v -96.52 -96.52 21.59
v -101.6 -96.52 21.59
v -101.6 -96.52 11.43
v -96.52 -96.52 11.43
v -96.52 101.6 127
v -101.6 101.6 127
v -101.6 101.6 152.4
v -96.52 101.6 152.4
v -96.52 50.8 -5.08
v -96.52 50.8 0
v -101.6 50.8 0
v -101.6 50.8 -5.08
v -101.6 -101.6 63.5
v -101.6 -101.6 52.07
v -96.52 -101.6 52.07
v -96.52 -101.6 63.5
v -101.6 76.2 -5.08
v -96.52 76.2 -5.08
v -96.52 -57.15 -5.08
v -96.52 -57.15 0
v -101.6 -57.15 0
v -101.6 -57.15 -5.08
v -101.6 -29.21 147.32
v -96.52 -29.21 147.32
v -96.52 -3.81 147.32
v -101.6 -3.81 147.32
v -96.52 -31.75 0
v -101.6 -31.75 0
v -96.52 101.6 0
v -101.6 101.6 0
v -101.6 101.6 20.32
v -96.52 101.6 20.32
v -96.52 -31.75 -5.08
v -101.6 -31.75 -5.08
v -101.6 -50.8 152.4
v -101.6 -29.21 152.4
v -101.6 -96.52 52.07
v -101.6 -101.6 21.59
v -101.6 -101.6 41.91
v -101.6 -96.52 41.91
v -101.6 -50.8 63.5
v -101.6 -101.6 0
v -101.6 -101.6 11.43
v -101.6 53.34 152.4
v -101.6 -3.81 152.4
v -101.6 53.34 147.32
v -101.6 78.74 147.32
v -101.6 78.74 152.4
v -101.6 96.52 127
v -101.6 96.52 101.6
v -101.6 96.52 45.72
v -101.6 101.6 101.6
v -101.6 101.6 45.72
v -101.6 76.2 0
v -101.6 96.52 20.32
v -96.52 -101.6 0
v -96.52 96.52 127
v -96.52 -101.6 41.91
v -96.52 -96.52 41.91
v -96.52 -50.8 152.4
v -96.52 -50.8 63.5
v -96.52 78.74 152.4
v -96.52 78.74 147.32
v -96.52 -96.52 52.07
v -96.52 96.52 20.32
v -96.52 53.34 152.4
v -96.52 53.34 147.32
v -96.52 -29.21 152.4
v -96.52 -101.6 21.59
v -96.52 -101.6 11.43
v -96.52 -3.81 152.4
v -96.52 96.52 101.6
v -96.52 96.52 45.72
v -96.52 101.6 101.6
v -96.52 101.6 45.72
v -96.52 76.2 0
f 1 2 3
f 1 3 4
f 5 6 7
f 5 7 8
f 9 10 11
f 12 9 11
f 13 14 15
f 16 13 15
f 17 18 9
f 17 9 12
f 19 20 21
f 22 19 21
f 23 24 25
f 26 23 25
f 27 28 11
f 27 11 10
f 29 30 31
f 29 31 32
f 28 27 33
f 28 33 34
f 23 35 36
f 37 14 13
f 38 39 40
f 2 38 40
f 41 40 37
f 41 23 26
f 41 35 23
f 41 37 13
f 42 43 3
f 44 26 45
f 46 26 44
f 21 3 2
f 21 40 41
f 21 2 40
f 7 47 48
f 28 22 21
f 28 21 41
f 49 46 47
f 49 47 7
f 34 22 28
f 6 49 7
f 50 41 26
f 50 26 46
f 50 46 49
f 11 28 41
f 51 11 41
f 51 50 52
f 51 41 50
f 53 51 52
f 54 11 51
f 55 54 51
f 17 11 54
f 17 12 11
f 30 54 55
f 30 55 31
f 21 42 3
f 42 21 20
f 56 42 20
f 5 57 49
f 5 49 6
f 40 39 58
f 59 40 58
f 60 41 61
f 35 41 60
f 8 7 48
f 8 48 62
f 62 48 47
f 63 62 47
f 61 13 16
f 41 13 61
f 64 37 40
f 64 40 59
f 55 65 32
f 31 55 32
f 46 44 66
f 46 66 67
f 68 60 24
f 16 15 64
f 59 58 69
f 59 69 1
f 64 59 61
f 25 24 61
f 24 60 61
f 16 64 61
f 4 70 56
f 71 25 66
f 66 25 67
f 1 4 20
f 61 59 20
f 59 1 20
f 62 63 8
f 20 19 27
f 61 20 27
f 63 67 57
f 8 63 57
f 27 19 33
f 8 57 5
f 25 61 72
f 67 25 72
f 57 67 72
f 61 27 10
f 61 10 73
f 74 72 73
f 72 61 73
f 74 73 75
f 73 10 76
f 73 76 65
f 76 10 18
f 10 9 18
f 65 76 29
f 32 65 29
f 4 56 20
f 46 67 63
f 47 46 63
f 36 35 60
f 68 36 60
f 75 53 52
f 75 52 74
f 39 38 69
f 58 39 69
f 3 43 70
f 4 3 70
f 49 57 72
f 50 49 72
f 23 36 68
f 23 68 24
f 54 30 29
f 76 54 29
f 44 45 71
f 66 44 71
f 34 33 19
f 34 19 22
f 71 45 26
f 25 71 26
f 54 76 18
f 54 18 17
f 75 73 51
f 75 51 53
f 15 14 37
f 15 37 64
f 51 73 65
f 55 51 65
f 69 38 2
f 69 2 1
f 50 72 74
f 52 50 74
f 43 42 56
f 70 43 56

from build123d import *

# Parameters (mm, degrees)
SKETCH1_W           = 5.08
SKETCH1_H           = 203.2
BOSS_EXTRUDE1_DEPTH = 152.4
SKETCH2_W           = 88.9
SKETCH2_H           = 50.8
CUT_EXTRUDE1_DEPTH  = 5.08
SKETCH3_W           = 5.08
SKETCH3_H           = 10.16
CUT_EXTRUDE2_DEPTH  = 5.08
SKETCH5_W           = 5.08
SKETCH5_H           = 25.4
BOSS_EXTRUDE2_DEPTH = 5.08
SKETCH6_W           = 25.4
SKETCH6_H           = 5.08
SKETCH6_W_2         = 5.08
SKETCH6_H_2         = 25.4
CUT_EXTRUDE3_DEPTH  = 5.08


with BuildPart() as part:
    # Sketch1 → Boss-Extrude1 (new body)
    with BuildSketch(Plane.XY):
        with Locations((-99.06, 0)):
            Rectangle(SKETCH1_W, SKETCH1_H)
    extrude(amount=BOSS_EXTRUDE1_DEPTH)

    # Sketch2 → Cut-Extrude1 (cut)
    with BuildSketch(Plane.ZY.offset(101.6)):
        with Locations((107.95, -76.2)):
            Rectangle(SKETCH2_W, SKETCH2_H)
    extrude(amount=-CUT_EXTRUDE1_DEPTH, mode=Mode.SUBTRACT)

    # Sketch3 → Cut-Extrude2 (cut)
    with BuildSketch(Plane.XZ.offset(101.6)):
        with Locations((-99.06, 46.99)):
            Rectangle(SKETCH3_W, SKETCH3_H)
        with Locations((-99.06, 16.51)):
            Rectangle(SKETCH3_W, SKETCH3_H)
    extrude(amount=-CUT_EXTRUDE2_DEPTH, mode=Mode.SUBTRACT)

    # Sketch5 → Boss-Extrude2 (add)
    with BuildSketch(Plane(origin=(0, 0, 0), x_dir=(-1, 0, 0), z_dir=(0, 0, -1))):
        with Locations((99.06, -44.45)):
            Rectangle(SKETCH5_W, SKETCH5_H)
        with Locations((99.06, 63.5)):
            Rectangle(SKETCH5_W, SKETCH5_H)
    extrude(amount=BOSS_EXTRUDE2_DEPTH)

    # Sketch6 → Cut-Extrude3 (cut)
    with BuildSketch(Plane(origin=(-96.52, 0, 0), x_dir=(0, 0, -1), z_dir=(1, 0, 0))):
        with Locations((-114.3, 99.06)):
            Rectangle(SKETCH6_W, SKETCH6_H)
        with Locations((-33.02, 99.06)):
            Rectangle(SKETCH6_W, SKETCH6_H)
        with Locations((-149.86, 66.04)):
            Rectangle(SKETCH6_W_2, SKETCH6_H_2)
        with Locations((-149.86, -16.51)):
            Rectangle(SKETCH6_W_2, SKETCH6_H_2)
    extrude(amount=-CUT_EXTRUDE3_DEPTH, mode=Mode.SUBTRACT)


solid = part.part
